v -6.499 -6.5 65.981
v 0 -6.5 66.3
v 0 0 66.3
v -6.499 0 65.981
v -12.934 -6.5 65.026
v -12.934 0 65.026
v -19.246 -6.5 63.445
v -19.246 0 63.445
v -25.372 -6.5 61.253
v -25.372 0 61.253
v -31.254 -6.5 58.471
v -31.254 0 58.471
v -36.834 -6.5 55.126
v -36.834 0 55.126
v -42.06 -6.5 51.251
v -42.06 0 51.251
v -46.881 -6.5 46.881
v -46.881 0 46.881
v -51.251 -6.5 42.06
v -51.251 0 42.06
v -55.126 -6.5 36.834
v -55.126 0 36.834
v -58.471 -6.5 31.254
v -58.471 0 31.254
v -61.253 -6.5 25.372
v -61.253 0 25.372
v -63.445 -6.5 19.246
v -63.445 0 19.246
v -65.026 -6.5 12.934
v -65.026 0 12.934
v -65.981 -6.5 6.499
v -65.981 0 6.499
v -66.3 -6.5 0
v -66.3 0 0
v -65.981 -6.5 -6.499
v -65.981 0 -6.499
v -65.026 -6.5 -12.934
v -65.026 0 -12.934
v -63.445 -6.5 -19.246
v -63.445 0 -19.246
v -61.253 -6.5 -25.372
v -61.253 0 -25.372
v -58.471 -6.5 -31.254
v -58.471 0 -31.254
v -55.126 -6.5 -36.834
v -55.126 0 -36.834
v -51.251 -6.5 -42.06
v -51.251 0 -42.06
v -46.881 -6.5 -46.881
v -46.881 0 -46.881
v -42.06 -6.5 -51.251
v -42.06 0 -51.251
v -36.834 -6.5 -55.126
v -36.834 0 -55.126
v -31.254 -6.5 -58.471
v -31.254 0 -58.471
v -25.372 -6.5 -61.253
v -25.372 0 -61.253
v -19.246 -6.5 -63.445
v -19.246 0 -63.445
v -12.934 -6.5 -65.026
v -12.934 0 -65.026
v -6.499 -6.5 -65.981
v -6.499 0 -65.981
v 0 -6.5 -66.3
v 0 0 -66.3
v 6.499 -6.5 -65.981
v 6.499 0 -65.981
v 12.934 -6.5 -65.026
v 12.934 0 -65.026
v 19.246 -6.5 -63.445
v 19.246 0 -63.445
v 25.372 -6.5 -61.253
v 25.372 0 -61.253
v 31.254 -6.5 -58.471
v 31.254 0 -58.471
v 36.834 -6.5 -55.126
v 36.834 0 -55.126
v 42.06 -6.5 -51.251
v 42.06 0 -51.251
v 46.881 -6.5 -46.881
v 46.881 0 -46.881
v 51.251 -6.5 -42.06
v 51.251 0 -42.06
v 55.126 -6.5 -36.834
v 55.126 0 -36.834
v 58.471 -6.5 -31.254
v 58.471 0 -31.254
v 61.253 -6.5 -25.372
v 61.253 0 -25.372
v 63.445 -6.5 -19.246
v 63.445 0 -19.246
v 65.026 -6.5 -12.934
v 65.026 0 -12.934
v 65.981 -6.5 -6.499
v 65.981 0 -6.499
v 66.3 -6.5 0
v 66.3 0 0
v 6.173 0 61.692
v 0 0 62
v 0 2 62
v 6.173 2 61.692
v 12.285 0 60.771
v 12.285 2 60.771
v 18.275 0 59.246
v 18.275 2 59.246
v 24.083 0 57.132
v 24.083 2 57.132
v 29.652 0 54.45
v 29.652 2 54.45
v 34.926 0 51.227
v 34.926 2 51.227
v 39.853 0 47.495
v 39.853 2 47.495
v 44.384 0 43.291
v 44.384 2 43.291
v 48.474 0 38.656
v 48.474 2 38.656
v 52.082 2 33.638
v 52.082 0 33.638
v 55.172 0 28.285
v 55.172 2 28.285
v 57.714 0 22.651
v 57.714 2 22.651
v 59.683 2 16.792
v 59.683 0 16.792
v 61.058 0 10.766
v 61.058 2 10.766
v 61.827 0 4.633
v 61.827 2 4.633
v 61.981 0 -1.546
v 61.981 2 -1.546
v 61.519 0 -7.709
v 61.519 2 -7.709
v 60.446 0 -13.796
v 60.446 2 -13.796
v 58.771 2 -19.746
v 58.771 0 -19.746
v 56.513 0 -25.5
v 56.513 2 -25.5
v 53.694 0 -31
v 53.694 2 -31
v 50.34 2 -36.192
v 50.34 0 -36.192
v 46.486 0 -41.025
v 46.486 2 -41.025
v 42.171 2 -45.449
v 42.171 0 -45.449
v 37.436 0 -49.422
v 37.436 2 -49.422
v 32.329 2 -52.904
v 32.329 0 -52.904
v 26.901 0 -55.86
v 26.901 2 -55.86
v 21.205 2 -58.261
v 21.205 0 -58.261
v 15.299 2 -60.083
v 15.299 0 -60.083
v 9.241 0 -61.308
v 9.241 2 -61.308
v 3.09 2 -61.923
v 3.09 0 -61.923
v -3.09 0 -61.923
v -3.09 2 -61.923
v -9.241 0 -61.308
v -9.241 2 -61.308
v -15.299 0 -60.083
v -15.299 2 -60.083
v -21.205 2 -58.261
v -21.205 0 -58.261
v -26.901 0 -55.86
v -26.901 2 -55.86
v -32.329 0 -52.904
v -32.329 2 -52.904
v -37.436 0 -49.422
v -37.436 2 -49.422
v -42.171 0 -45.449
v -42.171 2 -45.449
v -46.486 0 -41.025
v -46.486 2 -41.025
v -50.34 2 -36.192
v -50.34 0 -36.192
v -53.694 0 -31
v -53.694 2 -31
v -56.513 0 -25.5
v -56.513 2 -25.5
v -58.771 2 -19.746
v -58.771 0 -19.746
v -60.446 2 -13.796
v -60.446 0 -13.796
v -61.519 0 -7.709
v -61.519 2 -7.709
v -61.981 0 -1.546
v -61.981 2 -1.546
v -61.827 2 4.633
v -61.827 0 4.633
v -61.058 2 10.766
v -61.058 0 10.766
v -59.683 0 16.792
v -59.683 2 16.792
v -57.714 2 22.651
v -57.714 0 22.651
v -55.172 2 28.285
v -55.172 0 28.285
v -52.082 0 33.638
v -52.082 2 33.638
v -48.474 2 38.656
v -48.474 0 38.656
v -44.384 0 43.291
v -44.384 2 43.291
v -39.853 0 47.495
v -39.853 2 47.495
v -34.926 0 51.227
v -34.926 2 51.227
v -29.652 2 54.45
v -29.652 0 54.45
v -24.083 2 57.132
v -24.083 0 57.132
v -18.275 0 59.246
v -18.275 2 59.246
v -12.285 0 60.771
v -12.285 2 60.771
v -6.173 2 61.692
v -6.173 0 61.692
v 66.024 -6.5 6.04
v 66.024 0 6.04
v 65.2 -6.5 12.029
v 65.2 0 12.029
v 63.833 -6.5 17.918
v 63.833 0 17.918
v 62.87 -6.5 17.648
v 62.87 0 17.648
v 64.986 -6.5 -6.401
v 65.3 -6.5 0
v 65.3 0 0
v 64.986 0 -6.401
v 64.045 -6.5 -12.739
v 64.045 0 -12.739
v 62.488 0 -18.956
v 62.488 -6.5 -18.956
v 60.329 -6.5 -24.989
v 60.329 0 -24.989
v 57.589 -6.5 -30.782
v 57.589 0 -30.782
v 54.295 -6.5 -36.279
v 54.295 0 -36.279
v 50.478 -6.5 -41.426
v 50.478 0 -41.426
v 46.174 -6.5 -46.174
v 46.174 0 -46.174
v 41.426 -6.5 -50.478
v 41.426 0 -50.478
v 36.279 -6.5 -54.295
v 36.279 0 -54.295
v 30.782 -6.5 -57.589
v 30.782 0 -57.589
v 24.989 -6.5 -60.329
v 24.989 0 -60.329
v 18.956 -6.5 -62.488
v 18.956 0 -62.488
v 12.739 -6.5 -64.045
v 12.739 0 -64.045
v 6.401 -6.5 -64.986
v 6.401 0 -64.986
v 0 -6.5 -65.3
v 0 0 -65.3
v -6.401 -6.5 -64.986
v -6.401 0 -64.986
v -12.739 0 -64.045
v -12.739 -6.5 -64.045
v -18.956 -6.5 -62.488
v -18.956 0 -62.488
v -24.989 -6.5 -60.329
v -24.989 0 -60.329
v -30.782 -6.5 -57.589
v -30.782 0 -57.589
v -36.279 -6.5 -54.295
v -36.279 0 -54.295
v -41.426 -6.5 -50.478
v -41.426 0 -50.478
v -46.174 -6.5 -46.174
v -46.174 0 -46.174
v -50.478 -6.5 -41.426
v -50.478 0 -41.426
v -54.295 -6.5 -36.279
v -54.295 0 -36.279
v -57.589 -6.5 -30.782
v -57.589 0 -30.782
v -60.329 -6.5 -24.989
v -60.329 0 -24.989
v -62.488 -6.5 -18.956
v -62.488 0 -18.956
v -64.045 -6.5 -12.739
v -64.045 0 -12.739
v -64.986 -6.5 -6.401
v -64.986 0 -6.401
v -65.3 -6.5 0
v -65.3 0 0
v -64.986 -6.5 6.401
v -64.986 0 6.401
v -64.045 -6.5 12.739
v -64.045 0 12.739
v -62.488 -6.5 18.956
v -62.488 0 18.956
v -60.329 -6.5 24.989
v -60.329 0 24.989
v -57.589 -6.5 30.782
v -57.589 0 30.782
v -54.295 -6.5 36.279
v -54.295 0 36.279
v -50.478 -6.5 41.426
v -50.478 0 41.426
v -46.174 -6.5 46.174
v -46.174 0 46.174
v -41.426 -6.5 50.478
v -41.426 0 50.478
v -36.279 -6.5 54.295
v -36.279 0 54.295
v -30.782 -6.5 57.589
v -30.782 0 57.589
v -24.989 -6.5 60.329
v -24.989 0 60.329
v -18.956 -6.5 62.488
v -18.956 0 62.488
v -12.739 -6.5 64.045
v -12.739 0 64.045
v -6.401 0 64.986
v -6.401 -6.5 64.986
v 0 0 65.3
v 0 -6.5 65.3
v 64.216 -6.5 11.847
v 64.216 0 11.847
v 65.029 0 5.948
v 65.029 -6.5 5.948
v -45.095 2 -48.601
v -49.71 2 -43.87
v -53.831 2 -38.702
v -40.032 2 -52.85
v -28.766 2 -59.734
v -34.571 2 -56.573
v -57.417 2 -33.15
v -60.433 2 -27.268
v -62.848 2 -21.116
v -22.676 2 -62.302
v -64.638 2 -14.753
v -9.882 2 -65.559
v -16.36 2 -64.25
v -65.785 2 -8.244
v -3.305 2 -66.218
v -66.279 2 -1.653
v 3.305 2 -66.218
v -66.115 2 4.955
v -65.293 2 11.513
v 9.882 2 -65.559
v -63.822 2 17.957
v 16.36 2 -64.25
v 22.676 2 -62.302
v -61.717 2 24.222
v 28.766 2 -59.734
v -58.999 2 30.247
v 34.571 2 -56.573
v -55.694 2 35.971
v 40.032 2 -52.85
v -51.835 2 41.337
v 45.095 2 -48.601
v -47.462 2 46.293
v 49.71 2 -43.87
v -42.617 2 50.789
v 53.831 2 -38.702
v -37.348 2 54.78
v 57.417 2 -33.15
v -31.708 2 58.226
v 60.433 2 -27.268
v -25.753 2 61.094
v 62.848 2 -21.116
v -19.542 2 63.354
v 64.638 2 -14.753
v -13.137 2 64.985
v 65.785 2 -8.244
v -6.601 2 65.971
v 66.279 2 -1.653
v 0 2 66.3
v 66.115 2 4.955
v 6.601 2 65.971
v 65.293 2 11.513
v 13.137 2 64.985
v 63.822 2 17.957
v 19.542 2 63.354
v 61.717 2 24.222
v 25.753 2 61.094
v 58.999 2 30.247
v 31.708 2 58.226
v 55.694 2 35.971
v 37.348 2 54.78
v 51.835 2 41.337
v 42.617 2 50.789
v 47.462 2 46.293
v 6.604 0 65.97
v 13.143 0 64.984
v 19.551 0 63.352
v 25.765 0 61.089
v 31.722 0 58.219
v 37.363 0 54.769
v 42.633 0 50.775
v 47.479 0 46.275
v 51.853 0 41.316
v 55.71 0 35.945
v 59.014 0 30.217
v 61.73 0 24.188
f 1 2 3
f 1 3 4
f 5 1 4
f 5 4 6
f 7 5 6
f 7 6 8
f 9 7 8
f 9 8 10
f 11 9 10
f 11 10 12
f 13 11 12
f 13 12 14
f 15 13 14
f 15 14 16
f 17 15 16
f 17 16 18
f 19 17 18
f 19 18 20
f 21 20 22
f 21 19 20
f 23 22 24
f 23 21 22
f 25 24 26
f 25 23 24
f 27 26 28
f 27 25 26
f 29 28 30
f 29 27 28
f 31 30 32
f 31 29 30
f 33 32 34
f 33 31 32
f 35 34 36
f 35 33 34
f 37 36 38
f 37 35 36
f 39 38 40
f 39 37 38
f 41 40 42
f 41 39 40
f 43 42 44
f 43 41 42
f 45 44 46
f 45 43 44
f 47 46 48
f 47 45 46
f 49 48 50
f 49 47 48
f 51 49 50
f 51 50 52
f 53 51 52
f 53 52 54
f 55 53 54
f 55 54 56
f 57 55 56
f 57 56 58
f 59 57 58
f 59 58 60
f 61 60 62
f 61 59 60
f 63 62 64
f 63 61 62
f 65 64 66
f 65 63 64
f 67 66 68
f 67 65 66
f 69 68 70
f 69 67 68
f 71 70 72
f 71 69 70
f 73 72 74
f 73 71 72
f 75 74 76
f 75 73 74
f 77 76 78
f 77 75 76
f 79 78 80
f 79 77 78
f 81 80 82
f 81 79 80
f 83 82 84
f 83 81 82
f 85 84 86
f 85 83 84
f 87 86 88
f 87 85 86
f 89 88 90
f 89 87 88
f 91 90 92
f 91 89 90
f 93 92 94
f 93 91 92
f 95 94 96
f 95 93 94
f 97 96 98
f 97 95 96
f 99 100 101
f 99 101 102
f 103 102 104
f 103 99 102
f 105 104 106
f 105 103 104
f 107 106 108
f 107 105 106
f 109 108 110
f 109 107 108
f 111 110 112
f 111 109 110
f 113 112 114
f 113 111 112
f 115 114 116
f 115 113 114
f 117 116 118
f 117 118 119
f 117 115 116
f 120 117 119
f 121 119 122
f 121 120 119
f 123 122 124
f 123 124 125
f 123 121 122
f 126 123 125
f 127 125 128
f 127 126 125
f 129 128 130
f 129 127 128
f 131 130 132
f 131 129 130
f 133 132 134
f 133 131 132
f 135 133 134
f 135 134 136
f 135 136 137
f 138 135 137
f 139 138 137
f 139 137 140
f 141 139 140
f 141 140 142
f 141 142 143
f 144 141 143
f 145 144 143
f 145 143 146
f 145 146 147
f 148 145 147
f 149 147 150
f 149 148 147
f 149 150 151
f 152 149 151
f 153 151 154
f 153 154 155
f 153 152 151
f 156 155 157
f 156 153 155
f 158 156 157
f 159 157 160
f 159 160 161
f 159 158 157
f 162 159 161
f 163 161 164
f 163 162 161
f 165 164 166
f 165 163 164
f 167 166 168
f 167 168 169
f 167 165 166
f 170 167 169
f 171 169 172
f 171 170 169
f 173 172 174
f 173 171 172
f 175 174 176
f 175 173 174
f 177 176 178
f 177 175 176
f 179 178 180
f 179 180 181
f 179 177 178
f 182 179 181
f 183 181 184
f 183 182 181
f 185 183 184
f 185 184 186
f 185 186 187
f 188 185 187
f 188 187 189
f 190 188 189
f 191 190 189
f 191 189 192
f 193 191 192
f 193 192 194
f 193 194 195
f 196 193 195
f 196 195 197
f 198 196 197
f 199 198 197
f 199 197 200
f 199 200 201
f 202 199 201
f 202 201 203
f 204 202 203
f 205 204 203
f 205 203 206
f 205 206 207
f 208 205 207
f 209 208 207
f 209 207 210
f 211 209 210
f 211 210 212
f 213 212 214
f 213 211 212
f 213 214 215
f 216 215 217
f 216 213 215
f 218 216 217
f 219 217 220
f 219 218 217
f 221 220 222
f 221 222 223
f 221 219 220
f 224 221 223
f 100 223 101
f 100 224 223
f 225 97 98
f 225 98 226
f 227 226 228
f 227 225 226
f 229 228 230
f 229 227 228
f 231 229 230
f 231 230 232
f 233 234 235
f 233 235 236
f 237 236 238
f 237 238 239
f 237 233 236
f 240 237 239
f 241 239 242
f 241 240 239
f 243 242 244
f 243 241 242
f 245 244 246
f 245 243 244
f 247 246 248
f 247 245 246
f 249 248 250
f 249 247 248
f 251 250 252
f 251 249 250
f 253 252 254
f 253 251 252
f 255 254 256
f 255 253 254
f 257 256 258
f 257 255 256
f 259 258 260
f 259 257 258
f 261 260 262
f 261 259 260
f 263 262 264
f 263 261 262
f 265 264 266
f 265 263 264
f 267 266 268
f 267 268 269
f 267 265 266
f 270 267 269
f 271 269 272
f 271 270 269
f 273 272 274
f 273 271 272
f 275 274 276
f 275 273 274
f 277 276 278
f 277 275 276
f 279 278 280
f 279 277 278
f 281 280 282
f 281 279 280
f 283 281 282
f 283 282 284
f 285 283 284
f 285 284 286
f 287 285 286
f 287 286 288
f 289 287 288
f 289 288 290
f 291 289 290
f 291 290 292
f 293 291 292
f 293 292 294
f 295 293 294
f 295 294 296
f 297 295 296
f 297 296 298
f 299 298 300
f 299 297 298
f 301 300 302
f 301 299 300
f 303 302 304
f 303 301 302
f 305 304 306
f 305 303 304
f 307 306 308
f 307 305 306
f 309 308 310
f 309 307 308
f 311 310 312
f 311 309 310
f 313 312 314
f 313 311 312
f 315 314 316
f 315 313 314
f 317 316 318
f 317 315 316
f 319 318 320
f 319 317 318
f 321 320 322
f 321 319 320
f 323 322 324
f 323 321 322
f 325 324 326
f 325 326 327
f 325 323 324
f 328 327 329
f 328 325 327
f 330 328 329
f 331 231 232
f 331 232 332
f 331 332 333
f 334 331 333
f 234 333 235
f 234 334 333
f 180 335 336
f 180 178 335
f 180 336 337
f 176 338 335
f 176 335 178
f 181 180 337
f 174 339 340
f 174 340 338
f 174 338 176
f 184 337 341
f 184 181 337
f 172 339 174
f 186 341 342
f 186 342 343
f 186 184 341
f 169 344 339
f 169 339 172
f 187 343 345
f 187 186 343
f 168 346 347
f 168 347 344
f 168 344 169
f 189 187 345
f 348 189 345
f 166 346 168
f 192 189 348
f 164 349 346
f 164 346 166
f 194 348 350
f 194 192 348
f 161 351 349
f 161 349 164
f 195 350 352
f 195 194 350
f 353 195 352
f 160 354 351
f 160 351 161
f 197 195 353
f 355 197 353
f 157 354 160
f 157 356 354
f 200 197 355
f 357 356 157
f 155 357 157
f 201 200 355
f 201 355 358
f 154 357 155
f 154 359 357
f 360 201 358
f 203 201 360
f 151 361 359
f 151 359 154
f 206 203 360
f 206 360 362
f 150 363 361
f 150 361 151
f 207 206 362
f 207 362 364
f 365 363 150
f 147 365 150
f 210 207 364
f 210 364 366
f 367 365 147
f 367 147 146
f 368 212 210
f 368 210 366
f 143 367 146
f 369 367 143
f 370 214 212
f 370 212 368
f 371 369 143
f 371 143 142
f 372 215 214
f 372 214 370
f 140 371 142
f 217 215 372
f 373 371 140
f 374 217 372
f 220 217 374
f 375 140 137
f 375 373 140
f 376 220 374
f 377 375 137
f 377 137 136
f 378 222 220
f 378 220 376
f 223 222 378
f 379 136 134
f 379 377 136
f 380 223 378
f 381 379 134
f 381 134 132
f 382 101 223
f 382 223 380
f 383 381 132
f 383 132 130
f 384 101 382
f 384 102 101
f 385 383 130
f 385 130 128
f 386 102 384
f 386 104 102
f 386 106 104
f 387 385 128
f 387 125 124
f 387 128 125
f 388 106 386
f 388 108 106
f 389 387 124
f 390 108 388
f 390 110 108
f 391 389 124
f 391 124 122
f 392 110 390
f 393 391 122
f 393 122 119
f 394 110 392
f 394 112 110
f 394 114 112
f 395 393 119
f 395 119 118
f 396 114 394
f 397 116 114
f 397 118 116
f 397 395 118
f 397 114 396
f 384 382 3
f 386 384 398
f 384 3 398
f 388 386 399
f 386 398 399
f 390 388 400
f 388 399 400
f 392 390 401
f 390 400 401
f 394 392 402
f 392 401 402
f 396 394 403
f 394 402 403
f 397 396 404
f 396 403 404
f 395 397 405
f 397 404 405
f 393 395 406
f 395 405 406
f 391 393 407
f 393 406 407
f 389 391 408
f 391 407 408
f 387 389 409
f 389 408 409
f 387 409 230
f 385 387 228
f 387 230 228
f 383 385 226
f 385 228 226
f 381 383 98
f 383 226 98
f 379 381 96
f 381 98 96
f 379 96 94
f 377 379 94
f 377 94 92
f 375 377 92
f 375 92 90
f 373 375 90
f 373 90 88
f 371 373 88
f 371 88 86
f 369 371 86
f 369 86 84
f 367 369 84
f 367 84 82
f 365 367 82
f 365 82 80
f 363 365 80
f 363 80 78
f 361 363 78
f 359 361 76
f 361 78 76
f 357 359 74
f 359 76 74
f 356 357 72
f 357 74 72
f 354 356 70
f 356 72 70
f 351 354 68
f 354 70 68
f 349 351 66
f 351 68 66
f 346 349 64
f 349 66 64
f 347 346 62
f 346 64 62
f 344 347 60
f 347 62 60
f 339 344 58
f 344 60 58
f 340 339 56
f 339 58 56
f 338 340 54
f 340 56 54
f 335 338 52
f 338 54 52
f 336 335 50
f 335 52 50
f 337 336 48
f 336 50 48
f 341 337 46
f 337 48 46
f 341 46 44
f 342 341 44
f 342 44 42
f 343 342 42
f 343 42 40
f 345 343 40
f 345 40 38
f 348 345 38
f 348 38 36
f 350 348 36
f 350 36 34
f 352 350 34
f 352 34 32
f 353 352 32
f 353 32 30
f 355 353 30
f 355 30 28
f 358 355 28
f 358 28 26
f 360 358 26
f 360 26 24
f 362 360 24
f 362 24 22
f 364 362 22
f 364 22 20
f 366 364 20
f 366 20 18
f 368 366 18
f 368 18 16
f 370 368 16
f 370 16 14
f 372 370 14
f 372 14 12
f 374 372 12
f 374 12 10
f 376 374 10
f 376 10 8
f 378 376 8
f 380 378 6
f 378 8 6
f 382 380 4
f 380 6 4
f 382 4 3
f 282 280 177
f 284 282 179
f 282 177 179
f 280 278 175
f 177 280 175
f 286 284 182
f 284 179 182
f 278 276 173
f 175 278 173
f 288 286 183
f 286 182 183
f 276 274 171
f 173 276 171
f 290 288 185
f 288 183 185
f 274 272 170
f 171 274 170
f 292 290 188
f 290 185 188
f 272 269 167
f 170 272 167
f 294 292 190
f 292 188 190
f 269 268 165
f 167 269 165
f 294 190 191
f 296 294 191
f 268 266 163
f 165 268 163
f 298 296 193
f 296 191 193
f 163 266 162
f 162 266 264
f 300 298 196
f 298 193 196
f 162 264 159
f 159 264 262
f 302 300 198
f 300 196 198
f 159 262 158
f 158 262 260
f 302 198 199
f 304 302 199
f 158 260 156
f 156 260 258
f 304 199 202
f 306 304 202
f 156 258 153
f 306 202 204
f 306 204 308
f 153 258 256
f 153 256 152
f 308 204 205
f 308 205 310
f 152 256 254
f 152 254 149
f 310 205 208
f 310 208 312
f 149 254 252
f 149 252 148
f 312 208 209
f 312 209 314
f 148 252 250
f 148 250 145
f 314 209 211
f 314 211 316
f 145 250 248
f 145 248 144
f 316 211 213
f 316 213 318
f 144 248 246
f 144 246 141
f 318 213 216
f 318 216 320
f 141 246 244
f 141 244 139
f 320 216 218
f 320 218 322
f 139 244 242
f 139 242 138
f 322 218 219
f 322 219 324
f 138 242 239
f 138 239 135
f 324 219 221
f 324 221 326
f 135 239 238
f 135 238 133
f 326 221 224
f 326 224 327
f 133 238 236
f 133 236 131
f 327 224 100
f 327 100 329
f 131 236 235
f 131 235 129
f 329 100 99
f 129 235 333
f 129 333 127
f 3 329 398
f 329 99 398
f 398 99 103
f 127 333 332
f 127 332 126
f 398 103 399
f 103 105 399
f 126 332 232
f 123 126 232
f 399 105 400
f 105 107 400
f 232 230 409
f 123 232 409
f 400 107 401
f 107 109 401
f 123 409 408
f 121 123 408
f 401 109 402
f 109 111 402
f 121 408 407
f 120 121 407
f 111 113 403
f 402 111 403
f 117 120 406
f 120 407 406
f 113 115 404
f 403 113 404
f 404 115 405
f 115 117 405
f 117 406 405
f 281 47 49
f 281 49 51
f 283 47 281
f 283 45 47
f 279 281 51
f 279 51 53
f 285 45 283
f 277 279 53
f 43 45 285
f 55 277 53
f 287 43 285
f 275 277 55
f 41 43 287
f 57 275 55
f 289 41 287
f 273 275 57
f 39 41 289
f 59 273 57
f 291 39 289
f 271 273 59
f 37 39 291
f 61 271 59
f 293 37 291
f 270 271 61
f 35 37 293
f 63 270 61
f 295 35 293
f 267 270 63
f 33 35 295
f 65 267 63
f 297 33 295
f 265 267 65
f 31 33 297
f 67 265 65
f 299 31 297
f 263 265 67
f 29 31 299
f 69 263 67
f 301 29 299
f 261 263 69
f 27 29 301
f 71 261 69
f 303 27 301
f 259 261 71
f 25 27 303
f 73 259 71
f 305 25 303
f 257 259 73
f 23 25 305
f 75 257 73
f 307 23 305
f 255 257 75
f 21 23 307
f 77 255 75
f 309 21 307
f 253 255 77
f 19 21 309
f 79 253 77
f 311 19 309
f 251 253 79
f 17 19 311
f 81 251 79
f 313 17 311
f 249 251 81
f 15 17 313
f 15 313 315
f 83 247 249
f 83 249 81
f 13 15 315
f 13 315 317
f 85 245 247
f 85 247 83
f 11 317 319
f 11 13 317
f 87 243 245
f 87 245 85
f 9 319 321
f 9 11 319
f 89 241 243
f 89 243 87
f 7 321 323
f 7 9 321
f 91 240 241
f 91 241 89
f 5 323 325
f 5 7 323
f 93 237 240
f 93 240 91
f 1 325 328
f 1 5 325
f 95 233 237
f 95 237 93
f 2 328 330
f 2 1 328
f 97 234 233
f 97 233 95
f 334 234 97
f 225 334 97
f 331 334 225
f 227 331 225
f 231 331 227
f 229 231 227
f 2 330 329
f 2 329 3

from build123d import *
from build123d.topology import SkipClean

# Parameters (mm, degrees)
SKETCH2_R           = 66.3
SKETCH2_R_2         = 62
BOSS_EXTRUDE1_DEPTH = 2
BOSS_EXTRUDE2_START = 6.5
BOSS_EXTRUDE2_DEPTH = 6.5


with BuildPart() as part:
    # Sketch2 → Boss-Extrude1 (new body)
    with BuildSketch(Plane(origin=(0, 0, 0), x_dir=(1, 0, 0), z_dir=(0, 1, 0))):
        with Locations(Location((0, 0, 0), (0, 0, 270))):
            Circle(SKETCH2_R)
        with Locations(Location((0, 0, 0), (0, 0, 270))):
            Circle(SKETCH2_R_2, mode=Mode.SUBTRACT)
    extrude(amount=BOSS_EXTRUDE1_DEPTH)

    # Sketch3 → Boss-Extrude2 (add)
    with SkipClean():  # the faces are left unmerged after this step: merging them gives an invalid solid
        with BuildSketch(Plane.XZ.offset(BOSS_EXTRUDE2_START)):
            with BuildLine():
                ThreePointArc((65.3, 0), (-46.174072811, -46.174072811), (0, 65.3))
                Line((0, 65.3), (0, 66.3))
                ThreePointArc((0, 66.3), (-46.881179593, -46.881179593), (66.3, 0))
                ThreePointArc((66.3, 0), (65.680309111, 9.043616265), (63.832820659, 17.918175317))
                Line((63.832820659, 17.918175317), (62.870033017, 17.647916262))
                ThreePointArc((62.870033017, 17.647916262), (64.689655881, 8.907211796), (65.3, 0))
            make_face()
        extrude(amount=-BOSS_EXTRUDE2_DEPTH)


solid = part.part
